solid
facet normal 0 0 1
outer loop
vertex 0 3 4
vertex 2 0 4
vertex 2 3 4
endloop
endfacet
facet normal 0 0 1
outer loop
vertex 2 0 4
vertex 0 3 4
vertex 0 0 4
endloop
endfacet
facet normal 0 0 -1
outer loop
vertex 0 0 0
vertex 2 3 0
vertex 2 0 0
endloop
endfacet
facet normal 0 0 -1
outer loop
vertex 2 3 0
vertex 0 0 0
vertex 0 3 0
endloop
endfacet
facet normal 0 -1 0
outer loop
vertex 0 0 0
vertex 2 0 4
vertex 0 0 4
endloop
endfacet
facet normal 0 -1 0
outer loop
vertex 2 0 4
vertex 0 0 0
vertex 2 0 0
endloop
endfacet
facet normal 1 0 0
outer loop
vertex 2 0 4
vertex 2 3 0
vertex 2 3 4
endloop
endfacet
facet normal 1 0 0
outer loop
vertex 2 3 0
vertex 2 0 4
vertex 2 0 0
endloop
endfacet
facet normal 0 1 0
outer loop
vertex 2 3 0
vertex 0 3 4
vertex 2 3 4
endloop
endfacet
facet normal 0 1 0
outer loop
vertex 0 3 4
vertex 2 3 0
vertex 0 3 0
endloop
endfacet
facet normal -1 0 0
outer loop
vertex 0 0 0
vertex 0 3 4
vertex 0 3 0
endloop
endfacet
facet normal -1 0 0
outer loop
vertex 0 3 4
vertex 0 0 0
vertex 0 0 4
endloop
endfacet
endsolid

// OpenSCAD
// See http://en.wikibooks.org/wiki/OpenSCAD_User_Manual

// preview: F5
// compile and render: F6

cube([2,3,4]);
